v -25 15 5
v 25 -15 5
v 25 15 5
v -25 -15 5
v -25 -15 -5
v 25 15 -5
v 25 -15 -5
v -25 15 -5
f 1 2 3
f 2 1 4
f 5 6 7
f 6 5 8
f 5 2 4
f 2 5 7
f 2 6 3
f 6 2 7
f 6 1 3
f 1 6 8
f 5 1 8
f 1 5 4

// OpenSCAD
// Parameters
body_length = 50; //[25:100:1]
body_width  = 30; //[15:60:1]
body_height = 10; //[5:20:1]

$fn = 64;

// Main Body (single connected solid)
module component() {
    // Ensure non-degenerate dimensions so geometry always renders
    L = max(0.1, body_length);
    W = max(0.1, body_width);
    H = max(0.1, body_height);

    color([0.85, 0.85, 0.8])
        cube([L, W, H], center=true);
}

// Final Model
component();
